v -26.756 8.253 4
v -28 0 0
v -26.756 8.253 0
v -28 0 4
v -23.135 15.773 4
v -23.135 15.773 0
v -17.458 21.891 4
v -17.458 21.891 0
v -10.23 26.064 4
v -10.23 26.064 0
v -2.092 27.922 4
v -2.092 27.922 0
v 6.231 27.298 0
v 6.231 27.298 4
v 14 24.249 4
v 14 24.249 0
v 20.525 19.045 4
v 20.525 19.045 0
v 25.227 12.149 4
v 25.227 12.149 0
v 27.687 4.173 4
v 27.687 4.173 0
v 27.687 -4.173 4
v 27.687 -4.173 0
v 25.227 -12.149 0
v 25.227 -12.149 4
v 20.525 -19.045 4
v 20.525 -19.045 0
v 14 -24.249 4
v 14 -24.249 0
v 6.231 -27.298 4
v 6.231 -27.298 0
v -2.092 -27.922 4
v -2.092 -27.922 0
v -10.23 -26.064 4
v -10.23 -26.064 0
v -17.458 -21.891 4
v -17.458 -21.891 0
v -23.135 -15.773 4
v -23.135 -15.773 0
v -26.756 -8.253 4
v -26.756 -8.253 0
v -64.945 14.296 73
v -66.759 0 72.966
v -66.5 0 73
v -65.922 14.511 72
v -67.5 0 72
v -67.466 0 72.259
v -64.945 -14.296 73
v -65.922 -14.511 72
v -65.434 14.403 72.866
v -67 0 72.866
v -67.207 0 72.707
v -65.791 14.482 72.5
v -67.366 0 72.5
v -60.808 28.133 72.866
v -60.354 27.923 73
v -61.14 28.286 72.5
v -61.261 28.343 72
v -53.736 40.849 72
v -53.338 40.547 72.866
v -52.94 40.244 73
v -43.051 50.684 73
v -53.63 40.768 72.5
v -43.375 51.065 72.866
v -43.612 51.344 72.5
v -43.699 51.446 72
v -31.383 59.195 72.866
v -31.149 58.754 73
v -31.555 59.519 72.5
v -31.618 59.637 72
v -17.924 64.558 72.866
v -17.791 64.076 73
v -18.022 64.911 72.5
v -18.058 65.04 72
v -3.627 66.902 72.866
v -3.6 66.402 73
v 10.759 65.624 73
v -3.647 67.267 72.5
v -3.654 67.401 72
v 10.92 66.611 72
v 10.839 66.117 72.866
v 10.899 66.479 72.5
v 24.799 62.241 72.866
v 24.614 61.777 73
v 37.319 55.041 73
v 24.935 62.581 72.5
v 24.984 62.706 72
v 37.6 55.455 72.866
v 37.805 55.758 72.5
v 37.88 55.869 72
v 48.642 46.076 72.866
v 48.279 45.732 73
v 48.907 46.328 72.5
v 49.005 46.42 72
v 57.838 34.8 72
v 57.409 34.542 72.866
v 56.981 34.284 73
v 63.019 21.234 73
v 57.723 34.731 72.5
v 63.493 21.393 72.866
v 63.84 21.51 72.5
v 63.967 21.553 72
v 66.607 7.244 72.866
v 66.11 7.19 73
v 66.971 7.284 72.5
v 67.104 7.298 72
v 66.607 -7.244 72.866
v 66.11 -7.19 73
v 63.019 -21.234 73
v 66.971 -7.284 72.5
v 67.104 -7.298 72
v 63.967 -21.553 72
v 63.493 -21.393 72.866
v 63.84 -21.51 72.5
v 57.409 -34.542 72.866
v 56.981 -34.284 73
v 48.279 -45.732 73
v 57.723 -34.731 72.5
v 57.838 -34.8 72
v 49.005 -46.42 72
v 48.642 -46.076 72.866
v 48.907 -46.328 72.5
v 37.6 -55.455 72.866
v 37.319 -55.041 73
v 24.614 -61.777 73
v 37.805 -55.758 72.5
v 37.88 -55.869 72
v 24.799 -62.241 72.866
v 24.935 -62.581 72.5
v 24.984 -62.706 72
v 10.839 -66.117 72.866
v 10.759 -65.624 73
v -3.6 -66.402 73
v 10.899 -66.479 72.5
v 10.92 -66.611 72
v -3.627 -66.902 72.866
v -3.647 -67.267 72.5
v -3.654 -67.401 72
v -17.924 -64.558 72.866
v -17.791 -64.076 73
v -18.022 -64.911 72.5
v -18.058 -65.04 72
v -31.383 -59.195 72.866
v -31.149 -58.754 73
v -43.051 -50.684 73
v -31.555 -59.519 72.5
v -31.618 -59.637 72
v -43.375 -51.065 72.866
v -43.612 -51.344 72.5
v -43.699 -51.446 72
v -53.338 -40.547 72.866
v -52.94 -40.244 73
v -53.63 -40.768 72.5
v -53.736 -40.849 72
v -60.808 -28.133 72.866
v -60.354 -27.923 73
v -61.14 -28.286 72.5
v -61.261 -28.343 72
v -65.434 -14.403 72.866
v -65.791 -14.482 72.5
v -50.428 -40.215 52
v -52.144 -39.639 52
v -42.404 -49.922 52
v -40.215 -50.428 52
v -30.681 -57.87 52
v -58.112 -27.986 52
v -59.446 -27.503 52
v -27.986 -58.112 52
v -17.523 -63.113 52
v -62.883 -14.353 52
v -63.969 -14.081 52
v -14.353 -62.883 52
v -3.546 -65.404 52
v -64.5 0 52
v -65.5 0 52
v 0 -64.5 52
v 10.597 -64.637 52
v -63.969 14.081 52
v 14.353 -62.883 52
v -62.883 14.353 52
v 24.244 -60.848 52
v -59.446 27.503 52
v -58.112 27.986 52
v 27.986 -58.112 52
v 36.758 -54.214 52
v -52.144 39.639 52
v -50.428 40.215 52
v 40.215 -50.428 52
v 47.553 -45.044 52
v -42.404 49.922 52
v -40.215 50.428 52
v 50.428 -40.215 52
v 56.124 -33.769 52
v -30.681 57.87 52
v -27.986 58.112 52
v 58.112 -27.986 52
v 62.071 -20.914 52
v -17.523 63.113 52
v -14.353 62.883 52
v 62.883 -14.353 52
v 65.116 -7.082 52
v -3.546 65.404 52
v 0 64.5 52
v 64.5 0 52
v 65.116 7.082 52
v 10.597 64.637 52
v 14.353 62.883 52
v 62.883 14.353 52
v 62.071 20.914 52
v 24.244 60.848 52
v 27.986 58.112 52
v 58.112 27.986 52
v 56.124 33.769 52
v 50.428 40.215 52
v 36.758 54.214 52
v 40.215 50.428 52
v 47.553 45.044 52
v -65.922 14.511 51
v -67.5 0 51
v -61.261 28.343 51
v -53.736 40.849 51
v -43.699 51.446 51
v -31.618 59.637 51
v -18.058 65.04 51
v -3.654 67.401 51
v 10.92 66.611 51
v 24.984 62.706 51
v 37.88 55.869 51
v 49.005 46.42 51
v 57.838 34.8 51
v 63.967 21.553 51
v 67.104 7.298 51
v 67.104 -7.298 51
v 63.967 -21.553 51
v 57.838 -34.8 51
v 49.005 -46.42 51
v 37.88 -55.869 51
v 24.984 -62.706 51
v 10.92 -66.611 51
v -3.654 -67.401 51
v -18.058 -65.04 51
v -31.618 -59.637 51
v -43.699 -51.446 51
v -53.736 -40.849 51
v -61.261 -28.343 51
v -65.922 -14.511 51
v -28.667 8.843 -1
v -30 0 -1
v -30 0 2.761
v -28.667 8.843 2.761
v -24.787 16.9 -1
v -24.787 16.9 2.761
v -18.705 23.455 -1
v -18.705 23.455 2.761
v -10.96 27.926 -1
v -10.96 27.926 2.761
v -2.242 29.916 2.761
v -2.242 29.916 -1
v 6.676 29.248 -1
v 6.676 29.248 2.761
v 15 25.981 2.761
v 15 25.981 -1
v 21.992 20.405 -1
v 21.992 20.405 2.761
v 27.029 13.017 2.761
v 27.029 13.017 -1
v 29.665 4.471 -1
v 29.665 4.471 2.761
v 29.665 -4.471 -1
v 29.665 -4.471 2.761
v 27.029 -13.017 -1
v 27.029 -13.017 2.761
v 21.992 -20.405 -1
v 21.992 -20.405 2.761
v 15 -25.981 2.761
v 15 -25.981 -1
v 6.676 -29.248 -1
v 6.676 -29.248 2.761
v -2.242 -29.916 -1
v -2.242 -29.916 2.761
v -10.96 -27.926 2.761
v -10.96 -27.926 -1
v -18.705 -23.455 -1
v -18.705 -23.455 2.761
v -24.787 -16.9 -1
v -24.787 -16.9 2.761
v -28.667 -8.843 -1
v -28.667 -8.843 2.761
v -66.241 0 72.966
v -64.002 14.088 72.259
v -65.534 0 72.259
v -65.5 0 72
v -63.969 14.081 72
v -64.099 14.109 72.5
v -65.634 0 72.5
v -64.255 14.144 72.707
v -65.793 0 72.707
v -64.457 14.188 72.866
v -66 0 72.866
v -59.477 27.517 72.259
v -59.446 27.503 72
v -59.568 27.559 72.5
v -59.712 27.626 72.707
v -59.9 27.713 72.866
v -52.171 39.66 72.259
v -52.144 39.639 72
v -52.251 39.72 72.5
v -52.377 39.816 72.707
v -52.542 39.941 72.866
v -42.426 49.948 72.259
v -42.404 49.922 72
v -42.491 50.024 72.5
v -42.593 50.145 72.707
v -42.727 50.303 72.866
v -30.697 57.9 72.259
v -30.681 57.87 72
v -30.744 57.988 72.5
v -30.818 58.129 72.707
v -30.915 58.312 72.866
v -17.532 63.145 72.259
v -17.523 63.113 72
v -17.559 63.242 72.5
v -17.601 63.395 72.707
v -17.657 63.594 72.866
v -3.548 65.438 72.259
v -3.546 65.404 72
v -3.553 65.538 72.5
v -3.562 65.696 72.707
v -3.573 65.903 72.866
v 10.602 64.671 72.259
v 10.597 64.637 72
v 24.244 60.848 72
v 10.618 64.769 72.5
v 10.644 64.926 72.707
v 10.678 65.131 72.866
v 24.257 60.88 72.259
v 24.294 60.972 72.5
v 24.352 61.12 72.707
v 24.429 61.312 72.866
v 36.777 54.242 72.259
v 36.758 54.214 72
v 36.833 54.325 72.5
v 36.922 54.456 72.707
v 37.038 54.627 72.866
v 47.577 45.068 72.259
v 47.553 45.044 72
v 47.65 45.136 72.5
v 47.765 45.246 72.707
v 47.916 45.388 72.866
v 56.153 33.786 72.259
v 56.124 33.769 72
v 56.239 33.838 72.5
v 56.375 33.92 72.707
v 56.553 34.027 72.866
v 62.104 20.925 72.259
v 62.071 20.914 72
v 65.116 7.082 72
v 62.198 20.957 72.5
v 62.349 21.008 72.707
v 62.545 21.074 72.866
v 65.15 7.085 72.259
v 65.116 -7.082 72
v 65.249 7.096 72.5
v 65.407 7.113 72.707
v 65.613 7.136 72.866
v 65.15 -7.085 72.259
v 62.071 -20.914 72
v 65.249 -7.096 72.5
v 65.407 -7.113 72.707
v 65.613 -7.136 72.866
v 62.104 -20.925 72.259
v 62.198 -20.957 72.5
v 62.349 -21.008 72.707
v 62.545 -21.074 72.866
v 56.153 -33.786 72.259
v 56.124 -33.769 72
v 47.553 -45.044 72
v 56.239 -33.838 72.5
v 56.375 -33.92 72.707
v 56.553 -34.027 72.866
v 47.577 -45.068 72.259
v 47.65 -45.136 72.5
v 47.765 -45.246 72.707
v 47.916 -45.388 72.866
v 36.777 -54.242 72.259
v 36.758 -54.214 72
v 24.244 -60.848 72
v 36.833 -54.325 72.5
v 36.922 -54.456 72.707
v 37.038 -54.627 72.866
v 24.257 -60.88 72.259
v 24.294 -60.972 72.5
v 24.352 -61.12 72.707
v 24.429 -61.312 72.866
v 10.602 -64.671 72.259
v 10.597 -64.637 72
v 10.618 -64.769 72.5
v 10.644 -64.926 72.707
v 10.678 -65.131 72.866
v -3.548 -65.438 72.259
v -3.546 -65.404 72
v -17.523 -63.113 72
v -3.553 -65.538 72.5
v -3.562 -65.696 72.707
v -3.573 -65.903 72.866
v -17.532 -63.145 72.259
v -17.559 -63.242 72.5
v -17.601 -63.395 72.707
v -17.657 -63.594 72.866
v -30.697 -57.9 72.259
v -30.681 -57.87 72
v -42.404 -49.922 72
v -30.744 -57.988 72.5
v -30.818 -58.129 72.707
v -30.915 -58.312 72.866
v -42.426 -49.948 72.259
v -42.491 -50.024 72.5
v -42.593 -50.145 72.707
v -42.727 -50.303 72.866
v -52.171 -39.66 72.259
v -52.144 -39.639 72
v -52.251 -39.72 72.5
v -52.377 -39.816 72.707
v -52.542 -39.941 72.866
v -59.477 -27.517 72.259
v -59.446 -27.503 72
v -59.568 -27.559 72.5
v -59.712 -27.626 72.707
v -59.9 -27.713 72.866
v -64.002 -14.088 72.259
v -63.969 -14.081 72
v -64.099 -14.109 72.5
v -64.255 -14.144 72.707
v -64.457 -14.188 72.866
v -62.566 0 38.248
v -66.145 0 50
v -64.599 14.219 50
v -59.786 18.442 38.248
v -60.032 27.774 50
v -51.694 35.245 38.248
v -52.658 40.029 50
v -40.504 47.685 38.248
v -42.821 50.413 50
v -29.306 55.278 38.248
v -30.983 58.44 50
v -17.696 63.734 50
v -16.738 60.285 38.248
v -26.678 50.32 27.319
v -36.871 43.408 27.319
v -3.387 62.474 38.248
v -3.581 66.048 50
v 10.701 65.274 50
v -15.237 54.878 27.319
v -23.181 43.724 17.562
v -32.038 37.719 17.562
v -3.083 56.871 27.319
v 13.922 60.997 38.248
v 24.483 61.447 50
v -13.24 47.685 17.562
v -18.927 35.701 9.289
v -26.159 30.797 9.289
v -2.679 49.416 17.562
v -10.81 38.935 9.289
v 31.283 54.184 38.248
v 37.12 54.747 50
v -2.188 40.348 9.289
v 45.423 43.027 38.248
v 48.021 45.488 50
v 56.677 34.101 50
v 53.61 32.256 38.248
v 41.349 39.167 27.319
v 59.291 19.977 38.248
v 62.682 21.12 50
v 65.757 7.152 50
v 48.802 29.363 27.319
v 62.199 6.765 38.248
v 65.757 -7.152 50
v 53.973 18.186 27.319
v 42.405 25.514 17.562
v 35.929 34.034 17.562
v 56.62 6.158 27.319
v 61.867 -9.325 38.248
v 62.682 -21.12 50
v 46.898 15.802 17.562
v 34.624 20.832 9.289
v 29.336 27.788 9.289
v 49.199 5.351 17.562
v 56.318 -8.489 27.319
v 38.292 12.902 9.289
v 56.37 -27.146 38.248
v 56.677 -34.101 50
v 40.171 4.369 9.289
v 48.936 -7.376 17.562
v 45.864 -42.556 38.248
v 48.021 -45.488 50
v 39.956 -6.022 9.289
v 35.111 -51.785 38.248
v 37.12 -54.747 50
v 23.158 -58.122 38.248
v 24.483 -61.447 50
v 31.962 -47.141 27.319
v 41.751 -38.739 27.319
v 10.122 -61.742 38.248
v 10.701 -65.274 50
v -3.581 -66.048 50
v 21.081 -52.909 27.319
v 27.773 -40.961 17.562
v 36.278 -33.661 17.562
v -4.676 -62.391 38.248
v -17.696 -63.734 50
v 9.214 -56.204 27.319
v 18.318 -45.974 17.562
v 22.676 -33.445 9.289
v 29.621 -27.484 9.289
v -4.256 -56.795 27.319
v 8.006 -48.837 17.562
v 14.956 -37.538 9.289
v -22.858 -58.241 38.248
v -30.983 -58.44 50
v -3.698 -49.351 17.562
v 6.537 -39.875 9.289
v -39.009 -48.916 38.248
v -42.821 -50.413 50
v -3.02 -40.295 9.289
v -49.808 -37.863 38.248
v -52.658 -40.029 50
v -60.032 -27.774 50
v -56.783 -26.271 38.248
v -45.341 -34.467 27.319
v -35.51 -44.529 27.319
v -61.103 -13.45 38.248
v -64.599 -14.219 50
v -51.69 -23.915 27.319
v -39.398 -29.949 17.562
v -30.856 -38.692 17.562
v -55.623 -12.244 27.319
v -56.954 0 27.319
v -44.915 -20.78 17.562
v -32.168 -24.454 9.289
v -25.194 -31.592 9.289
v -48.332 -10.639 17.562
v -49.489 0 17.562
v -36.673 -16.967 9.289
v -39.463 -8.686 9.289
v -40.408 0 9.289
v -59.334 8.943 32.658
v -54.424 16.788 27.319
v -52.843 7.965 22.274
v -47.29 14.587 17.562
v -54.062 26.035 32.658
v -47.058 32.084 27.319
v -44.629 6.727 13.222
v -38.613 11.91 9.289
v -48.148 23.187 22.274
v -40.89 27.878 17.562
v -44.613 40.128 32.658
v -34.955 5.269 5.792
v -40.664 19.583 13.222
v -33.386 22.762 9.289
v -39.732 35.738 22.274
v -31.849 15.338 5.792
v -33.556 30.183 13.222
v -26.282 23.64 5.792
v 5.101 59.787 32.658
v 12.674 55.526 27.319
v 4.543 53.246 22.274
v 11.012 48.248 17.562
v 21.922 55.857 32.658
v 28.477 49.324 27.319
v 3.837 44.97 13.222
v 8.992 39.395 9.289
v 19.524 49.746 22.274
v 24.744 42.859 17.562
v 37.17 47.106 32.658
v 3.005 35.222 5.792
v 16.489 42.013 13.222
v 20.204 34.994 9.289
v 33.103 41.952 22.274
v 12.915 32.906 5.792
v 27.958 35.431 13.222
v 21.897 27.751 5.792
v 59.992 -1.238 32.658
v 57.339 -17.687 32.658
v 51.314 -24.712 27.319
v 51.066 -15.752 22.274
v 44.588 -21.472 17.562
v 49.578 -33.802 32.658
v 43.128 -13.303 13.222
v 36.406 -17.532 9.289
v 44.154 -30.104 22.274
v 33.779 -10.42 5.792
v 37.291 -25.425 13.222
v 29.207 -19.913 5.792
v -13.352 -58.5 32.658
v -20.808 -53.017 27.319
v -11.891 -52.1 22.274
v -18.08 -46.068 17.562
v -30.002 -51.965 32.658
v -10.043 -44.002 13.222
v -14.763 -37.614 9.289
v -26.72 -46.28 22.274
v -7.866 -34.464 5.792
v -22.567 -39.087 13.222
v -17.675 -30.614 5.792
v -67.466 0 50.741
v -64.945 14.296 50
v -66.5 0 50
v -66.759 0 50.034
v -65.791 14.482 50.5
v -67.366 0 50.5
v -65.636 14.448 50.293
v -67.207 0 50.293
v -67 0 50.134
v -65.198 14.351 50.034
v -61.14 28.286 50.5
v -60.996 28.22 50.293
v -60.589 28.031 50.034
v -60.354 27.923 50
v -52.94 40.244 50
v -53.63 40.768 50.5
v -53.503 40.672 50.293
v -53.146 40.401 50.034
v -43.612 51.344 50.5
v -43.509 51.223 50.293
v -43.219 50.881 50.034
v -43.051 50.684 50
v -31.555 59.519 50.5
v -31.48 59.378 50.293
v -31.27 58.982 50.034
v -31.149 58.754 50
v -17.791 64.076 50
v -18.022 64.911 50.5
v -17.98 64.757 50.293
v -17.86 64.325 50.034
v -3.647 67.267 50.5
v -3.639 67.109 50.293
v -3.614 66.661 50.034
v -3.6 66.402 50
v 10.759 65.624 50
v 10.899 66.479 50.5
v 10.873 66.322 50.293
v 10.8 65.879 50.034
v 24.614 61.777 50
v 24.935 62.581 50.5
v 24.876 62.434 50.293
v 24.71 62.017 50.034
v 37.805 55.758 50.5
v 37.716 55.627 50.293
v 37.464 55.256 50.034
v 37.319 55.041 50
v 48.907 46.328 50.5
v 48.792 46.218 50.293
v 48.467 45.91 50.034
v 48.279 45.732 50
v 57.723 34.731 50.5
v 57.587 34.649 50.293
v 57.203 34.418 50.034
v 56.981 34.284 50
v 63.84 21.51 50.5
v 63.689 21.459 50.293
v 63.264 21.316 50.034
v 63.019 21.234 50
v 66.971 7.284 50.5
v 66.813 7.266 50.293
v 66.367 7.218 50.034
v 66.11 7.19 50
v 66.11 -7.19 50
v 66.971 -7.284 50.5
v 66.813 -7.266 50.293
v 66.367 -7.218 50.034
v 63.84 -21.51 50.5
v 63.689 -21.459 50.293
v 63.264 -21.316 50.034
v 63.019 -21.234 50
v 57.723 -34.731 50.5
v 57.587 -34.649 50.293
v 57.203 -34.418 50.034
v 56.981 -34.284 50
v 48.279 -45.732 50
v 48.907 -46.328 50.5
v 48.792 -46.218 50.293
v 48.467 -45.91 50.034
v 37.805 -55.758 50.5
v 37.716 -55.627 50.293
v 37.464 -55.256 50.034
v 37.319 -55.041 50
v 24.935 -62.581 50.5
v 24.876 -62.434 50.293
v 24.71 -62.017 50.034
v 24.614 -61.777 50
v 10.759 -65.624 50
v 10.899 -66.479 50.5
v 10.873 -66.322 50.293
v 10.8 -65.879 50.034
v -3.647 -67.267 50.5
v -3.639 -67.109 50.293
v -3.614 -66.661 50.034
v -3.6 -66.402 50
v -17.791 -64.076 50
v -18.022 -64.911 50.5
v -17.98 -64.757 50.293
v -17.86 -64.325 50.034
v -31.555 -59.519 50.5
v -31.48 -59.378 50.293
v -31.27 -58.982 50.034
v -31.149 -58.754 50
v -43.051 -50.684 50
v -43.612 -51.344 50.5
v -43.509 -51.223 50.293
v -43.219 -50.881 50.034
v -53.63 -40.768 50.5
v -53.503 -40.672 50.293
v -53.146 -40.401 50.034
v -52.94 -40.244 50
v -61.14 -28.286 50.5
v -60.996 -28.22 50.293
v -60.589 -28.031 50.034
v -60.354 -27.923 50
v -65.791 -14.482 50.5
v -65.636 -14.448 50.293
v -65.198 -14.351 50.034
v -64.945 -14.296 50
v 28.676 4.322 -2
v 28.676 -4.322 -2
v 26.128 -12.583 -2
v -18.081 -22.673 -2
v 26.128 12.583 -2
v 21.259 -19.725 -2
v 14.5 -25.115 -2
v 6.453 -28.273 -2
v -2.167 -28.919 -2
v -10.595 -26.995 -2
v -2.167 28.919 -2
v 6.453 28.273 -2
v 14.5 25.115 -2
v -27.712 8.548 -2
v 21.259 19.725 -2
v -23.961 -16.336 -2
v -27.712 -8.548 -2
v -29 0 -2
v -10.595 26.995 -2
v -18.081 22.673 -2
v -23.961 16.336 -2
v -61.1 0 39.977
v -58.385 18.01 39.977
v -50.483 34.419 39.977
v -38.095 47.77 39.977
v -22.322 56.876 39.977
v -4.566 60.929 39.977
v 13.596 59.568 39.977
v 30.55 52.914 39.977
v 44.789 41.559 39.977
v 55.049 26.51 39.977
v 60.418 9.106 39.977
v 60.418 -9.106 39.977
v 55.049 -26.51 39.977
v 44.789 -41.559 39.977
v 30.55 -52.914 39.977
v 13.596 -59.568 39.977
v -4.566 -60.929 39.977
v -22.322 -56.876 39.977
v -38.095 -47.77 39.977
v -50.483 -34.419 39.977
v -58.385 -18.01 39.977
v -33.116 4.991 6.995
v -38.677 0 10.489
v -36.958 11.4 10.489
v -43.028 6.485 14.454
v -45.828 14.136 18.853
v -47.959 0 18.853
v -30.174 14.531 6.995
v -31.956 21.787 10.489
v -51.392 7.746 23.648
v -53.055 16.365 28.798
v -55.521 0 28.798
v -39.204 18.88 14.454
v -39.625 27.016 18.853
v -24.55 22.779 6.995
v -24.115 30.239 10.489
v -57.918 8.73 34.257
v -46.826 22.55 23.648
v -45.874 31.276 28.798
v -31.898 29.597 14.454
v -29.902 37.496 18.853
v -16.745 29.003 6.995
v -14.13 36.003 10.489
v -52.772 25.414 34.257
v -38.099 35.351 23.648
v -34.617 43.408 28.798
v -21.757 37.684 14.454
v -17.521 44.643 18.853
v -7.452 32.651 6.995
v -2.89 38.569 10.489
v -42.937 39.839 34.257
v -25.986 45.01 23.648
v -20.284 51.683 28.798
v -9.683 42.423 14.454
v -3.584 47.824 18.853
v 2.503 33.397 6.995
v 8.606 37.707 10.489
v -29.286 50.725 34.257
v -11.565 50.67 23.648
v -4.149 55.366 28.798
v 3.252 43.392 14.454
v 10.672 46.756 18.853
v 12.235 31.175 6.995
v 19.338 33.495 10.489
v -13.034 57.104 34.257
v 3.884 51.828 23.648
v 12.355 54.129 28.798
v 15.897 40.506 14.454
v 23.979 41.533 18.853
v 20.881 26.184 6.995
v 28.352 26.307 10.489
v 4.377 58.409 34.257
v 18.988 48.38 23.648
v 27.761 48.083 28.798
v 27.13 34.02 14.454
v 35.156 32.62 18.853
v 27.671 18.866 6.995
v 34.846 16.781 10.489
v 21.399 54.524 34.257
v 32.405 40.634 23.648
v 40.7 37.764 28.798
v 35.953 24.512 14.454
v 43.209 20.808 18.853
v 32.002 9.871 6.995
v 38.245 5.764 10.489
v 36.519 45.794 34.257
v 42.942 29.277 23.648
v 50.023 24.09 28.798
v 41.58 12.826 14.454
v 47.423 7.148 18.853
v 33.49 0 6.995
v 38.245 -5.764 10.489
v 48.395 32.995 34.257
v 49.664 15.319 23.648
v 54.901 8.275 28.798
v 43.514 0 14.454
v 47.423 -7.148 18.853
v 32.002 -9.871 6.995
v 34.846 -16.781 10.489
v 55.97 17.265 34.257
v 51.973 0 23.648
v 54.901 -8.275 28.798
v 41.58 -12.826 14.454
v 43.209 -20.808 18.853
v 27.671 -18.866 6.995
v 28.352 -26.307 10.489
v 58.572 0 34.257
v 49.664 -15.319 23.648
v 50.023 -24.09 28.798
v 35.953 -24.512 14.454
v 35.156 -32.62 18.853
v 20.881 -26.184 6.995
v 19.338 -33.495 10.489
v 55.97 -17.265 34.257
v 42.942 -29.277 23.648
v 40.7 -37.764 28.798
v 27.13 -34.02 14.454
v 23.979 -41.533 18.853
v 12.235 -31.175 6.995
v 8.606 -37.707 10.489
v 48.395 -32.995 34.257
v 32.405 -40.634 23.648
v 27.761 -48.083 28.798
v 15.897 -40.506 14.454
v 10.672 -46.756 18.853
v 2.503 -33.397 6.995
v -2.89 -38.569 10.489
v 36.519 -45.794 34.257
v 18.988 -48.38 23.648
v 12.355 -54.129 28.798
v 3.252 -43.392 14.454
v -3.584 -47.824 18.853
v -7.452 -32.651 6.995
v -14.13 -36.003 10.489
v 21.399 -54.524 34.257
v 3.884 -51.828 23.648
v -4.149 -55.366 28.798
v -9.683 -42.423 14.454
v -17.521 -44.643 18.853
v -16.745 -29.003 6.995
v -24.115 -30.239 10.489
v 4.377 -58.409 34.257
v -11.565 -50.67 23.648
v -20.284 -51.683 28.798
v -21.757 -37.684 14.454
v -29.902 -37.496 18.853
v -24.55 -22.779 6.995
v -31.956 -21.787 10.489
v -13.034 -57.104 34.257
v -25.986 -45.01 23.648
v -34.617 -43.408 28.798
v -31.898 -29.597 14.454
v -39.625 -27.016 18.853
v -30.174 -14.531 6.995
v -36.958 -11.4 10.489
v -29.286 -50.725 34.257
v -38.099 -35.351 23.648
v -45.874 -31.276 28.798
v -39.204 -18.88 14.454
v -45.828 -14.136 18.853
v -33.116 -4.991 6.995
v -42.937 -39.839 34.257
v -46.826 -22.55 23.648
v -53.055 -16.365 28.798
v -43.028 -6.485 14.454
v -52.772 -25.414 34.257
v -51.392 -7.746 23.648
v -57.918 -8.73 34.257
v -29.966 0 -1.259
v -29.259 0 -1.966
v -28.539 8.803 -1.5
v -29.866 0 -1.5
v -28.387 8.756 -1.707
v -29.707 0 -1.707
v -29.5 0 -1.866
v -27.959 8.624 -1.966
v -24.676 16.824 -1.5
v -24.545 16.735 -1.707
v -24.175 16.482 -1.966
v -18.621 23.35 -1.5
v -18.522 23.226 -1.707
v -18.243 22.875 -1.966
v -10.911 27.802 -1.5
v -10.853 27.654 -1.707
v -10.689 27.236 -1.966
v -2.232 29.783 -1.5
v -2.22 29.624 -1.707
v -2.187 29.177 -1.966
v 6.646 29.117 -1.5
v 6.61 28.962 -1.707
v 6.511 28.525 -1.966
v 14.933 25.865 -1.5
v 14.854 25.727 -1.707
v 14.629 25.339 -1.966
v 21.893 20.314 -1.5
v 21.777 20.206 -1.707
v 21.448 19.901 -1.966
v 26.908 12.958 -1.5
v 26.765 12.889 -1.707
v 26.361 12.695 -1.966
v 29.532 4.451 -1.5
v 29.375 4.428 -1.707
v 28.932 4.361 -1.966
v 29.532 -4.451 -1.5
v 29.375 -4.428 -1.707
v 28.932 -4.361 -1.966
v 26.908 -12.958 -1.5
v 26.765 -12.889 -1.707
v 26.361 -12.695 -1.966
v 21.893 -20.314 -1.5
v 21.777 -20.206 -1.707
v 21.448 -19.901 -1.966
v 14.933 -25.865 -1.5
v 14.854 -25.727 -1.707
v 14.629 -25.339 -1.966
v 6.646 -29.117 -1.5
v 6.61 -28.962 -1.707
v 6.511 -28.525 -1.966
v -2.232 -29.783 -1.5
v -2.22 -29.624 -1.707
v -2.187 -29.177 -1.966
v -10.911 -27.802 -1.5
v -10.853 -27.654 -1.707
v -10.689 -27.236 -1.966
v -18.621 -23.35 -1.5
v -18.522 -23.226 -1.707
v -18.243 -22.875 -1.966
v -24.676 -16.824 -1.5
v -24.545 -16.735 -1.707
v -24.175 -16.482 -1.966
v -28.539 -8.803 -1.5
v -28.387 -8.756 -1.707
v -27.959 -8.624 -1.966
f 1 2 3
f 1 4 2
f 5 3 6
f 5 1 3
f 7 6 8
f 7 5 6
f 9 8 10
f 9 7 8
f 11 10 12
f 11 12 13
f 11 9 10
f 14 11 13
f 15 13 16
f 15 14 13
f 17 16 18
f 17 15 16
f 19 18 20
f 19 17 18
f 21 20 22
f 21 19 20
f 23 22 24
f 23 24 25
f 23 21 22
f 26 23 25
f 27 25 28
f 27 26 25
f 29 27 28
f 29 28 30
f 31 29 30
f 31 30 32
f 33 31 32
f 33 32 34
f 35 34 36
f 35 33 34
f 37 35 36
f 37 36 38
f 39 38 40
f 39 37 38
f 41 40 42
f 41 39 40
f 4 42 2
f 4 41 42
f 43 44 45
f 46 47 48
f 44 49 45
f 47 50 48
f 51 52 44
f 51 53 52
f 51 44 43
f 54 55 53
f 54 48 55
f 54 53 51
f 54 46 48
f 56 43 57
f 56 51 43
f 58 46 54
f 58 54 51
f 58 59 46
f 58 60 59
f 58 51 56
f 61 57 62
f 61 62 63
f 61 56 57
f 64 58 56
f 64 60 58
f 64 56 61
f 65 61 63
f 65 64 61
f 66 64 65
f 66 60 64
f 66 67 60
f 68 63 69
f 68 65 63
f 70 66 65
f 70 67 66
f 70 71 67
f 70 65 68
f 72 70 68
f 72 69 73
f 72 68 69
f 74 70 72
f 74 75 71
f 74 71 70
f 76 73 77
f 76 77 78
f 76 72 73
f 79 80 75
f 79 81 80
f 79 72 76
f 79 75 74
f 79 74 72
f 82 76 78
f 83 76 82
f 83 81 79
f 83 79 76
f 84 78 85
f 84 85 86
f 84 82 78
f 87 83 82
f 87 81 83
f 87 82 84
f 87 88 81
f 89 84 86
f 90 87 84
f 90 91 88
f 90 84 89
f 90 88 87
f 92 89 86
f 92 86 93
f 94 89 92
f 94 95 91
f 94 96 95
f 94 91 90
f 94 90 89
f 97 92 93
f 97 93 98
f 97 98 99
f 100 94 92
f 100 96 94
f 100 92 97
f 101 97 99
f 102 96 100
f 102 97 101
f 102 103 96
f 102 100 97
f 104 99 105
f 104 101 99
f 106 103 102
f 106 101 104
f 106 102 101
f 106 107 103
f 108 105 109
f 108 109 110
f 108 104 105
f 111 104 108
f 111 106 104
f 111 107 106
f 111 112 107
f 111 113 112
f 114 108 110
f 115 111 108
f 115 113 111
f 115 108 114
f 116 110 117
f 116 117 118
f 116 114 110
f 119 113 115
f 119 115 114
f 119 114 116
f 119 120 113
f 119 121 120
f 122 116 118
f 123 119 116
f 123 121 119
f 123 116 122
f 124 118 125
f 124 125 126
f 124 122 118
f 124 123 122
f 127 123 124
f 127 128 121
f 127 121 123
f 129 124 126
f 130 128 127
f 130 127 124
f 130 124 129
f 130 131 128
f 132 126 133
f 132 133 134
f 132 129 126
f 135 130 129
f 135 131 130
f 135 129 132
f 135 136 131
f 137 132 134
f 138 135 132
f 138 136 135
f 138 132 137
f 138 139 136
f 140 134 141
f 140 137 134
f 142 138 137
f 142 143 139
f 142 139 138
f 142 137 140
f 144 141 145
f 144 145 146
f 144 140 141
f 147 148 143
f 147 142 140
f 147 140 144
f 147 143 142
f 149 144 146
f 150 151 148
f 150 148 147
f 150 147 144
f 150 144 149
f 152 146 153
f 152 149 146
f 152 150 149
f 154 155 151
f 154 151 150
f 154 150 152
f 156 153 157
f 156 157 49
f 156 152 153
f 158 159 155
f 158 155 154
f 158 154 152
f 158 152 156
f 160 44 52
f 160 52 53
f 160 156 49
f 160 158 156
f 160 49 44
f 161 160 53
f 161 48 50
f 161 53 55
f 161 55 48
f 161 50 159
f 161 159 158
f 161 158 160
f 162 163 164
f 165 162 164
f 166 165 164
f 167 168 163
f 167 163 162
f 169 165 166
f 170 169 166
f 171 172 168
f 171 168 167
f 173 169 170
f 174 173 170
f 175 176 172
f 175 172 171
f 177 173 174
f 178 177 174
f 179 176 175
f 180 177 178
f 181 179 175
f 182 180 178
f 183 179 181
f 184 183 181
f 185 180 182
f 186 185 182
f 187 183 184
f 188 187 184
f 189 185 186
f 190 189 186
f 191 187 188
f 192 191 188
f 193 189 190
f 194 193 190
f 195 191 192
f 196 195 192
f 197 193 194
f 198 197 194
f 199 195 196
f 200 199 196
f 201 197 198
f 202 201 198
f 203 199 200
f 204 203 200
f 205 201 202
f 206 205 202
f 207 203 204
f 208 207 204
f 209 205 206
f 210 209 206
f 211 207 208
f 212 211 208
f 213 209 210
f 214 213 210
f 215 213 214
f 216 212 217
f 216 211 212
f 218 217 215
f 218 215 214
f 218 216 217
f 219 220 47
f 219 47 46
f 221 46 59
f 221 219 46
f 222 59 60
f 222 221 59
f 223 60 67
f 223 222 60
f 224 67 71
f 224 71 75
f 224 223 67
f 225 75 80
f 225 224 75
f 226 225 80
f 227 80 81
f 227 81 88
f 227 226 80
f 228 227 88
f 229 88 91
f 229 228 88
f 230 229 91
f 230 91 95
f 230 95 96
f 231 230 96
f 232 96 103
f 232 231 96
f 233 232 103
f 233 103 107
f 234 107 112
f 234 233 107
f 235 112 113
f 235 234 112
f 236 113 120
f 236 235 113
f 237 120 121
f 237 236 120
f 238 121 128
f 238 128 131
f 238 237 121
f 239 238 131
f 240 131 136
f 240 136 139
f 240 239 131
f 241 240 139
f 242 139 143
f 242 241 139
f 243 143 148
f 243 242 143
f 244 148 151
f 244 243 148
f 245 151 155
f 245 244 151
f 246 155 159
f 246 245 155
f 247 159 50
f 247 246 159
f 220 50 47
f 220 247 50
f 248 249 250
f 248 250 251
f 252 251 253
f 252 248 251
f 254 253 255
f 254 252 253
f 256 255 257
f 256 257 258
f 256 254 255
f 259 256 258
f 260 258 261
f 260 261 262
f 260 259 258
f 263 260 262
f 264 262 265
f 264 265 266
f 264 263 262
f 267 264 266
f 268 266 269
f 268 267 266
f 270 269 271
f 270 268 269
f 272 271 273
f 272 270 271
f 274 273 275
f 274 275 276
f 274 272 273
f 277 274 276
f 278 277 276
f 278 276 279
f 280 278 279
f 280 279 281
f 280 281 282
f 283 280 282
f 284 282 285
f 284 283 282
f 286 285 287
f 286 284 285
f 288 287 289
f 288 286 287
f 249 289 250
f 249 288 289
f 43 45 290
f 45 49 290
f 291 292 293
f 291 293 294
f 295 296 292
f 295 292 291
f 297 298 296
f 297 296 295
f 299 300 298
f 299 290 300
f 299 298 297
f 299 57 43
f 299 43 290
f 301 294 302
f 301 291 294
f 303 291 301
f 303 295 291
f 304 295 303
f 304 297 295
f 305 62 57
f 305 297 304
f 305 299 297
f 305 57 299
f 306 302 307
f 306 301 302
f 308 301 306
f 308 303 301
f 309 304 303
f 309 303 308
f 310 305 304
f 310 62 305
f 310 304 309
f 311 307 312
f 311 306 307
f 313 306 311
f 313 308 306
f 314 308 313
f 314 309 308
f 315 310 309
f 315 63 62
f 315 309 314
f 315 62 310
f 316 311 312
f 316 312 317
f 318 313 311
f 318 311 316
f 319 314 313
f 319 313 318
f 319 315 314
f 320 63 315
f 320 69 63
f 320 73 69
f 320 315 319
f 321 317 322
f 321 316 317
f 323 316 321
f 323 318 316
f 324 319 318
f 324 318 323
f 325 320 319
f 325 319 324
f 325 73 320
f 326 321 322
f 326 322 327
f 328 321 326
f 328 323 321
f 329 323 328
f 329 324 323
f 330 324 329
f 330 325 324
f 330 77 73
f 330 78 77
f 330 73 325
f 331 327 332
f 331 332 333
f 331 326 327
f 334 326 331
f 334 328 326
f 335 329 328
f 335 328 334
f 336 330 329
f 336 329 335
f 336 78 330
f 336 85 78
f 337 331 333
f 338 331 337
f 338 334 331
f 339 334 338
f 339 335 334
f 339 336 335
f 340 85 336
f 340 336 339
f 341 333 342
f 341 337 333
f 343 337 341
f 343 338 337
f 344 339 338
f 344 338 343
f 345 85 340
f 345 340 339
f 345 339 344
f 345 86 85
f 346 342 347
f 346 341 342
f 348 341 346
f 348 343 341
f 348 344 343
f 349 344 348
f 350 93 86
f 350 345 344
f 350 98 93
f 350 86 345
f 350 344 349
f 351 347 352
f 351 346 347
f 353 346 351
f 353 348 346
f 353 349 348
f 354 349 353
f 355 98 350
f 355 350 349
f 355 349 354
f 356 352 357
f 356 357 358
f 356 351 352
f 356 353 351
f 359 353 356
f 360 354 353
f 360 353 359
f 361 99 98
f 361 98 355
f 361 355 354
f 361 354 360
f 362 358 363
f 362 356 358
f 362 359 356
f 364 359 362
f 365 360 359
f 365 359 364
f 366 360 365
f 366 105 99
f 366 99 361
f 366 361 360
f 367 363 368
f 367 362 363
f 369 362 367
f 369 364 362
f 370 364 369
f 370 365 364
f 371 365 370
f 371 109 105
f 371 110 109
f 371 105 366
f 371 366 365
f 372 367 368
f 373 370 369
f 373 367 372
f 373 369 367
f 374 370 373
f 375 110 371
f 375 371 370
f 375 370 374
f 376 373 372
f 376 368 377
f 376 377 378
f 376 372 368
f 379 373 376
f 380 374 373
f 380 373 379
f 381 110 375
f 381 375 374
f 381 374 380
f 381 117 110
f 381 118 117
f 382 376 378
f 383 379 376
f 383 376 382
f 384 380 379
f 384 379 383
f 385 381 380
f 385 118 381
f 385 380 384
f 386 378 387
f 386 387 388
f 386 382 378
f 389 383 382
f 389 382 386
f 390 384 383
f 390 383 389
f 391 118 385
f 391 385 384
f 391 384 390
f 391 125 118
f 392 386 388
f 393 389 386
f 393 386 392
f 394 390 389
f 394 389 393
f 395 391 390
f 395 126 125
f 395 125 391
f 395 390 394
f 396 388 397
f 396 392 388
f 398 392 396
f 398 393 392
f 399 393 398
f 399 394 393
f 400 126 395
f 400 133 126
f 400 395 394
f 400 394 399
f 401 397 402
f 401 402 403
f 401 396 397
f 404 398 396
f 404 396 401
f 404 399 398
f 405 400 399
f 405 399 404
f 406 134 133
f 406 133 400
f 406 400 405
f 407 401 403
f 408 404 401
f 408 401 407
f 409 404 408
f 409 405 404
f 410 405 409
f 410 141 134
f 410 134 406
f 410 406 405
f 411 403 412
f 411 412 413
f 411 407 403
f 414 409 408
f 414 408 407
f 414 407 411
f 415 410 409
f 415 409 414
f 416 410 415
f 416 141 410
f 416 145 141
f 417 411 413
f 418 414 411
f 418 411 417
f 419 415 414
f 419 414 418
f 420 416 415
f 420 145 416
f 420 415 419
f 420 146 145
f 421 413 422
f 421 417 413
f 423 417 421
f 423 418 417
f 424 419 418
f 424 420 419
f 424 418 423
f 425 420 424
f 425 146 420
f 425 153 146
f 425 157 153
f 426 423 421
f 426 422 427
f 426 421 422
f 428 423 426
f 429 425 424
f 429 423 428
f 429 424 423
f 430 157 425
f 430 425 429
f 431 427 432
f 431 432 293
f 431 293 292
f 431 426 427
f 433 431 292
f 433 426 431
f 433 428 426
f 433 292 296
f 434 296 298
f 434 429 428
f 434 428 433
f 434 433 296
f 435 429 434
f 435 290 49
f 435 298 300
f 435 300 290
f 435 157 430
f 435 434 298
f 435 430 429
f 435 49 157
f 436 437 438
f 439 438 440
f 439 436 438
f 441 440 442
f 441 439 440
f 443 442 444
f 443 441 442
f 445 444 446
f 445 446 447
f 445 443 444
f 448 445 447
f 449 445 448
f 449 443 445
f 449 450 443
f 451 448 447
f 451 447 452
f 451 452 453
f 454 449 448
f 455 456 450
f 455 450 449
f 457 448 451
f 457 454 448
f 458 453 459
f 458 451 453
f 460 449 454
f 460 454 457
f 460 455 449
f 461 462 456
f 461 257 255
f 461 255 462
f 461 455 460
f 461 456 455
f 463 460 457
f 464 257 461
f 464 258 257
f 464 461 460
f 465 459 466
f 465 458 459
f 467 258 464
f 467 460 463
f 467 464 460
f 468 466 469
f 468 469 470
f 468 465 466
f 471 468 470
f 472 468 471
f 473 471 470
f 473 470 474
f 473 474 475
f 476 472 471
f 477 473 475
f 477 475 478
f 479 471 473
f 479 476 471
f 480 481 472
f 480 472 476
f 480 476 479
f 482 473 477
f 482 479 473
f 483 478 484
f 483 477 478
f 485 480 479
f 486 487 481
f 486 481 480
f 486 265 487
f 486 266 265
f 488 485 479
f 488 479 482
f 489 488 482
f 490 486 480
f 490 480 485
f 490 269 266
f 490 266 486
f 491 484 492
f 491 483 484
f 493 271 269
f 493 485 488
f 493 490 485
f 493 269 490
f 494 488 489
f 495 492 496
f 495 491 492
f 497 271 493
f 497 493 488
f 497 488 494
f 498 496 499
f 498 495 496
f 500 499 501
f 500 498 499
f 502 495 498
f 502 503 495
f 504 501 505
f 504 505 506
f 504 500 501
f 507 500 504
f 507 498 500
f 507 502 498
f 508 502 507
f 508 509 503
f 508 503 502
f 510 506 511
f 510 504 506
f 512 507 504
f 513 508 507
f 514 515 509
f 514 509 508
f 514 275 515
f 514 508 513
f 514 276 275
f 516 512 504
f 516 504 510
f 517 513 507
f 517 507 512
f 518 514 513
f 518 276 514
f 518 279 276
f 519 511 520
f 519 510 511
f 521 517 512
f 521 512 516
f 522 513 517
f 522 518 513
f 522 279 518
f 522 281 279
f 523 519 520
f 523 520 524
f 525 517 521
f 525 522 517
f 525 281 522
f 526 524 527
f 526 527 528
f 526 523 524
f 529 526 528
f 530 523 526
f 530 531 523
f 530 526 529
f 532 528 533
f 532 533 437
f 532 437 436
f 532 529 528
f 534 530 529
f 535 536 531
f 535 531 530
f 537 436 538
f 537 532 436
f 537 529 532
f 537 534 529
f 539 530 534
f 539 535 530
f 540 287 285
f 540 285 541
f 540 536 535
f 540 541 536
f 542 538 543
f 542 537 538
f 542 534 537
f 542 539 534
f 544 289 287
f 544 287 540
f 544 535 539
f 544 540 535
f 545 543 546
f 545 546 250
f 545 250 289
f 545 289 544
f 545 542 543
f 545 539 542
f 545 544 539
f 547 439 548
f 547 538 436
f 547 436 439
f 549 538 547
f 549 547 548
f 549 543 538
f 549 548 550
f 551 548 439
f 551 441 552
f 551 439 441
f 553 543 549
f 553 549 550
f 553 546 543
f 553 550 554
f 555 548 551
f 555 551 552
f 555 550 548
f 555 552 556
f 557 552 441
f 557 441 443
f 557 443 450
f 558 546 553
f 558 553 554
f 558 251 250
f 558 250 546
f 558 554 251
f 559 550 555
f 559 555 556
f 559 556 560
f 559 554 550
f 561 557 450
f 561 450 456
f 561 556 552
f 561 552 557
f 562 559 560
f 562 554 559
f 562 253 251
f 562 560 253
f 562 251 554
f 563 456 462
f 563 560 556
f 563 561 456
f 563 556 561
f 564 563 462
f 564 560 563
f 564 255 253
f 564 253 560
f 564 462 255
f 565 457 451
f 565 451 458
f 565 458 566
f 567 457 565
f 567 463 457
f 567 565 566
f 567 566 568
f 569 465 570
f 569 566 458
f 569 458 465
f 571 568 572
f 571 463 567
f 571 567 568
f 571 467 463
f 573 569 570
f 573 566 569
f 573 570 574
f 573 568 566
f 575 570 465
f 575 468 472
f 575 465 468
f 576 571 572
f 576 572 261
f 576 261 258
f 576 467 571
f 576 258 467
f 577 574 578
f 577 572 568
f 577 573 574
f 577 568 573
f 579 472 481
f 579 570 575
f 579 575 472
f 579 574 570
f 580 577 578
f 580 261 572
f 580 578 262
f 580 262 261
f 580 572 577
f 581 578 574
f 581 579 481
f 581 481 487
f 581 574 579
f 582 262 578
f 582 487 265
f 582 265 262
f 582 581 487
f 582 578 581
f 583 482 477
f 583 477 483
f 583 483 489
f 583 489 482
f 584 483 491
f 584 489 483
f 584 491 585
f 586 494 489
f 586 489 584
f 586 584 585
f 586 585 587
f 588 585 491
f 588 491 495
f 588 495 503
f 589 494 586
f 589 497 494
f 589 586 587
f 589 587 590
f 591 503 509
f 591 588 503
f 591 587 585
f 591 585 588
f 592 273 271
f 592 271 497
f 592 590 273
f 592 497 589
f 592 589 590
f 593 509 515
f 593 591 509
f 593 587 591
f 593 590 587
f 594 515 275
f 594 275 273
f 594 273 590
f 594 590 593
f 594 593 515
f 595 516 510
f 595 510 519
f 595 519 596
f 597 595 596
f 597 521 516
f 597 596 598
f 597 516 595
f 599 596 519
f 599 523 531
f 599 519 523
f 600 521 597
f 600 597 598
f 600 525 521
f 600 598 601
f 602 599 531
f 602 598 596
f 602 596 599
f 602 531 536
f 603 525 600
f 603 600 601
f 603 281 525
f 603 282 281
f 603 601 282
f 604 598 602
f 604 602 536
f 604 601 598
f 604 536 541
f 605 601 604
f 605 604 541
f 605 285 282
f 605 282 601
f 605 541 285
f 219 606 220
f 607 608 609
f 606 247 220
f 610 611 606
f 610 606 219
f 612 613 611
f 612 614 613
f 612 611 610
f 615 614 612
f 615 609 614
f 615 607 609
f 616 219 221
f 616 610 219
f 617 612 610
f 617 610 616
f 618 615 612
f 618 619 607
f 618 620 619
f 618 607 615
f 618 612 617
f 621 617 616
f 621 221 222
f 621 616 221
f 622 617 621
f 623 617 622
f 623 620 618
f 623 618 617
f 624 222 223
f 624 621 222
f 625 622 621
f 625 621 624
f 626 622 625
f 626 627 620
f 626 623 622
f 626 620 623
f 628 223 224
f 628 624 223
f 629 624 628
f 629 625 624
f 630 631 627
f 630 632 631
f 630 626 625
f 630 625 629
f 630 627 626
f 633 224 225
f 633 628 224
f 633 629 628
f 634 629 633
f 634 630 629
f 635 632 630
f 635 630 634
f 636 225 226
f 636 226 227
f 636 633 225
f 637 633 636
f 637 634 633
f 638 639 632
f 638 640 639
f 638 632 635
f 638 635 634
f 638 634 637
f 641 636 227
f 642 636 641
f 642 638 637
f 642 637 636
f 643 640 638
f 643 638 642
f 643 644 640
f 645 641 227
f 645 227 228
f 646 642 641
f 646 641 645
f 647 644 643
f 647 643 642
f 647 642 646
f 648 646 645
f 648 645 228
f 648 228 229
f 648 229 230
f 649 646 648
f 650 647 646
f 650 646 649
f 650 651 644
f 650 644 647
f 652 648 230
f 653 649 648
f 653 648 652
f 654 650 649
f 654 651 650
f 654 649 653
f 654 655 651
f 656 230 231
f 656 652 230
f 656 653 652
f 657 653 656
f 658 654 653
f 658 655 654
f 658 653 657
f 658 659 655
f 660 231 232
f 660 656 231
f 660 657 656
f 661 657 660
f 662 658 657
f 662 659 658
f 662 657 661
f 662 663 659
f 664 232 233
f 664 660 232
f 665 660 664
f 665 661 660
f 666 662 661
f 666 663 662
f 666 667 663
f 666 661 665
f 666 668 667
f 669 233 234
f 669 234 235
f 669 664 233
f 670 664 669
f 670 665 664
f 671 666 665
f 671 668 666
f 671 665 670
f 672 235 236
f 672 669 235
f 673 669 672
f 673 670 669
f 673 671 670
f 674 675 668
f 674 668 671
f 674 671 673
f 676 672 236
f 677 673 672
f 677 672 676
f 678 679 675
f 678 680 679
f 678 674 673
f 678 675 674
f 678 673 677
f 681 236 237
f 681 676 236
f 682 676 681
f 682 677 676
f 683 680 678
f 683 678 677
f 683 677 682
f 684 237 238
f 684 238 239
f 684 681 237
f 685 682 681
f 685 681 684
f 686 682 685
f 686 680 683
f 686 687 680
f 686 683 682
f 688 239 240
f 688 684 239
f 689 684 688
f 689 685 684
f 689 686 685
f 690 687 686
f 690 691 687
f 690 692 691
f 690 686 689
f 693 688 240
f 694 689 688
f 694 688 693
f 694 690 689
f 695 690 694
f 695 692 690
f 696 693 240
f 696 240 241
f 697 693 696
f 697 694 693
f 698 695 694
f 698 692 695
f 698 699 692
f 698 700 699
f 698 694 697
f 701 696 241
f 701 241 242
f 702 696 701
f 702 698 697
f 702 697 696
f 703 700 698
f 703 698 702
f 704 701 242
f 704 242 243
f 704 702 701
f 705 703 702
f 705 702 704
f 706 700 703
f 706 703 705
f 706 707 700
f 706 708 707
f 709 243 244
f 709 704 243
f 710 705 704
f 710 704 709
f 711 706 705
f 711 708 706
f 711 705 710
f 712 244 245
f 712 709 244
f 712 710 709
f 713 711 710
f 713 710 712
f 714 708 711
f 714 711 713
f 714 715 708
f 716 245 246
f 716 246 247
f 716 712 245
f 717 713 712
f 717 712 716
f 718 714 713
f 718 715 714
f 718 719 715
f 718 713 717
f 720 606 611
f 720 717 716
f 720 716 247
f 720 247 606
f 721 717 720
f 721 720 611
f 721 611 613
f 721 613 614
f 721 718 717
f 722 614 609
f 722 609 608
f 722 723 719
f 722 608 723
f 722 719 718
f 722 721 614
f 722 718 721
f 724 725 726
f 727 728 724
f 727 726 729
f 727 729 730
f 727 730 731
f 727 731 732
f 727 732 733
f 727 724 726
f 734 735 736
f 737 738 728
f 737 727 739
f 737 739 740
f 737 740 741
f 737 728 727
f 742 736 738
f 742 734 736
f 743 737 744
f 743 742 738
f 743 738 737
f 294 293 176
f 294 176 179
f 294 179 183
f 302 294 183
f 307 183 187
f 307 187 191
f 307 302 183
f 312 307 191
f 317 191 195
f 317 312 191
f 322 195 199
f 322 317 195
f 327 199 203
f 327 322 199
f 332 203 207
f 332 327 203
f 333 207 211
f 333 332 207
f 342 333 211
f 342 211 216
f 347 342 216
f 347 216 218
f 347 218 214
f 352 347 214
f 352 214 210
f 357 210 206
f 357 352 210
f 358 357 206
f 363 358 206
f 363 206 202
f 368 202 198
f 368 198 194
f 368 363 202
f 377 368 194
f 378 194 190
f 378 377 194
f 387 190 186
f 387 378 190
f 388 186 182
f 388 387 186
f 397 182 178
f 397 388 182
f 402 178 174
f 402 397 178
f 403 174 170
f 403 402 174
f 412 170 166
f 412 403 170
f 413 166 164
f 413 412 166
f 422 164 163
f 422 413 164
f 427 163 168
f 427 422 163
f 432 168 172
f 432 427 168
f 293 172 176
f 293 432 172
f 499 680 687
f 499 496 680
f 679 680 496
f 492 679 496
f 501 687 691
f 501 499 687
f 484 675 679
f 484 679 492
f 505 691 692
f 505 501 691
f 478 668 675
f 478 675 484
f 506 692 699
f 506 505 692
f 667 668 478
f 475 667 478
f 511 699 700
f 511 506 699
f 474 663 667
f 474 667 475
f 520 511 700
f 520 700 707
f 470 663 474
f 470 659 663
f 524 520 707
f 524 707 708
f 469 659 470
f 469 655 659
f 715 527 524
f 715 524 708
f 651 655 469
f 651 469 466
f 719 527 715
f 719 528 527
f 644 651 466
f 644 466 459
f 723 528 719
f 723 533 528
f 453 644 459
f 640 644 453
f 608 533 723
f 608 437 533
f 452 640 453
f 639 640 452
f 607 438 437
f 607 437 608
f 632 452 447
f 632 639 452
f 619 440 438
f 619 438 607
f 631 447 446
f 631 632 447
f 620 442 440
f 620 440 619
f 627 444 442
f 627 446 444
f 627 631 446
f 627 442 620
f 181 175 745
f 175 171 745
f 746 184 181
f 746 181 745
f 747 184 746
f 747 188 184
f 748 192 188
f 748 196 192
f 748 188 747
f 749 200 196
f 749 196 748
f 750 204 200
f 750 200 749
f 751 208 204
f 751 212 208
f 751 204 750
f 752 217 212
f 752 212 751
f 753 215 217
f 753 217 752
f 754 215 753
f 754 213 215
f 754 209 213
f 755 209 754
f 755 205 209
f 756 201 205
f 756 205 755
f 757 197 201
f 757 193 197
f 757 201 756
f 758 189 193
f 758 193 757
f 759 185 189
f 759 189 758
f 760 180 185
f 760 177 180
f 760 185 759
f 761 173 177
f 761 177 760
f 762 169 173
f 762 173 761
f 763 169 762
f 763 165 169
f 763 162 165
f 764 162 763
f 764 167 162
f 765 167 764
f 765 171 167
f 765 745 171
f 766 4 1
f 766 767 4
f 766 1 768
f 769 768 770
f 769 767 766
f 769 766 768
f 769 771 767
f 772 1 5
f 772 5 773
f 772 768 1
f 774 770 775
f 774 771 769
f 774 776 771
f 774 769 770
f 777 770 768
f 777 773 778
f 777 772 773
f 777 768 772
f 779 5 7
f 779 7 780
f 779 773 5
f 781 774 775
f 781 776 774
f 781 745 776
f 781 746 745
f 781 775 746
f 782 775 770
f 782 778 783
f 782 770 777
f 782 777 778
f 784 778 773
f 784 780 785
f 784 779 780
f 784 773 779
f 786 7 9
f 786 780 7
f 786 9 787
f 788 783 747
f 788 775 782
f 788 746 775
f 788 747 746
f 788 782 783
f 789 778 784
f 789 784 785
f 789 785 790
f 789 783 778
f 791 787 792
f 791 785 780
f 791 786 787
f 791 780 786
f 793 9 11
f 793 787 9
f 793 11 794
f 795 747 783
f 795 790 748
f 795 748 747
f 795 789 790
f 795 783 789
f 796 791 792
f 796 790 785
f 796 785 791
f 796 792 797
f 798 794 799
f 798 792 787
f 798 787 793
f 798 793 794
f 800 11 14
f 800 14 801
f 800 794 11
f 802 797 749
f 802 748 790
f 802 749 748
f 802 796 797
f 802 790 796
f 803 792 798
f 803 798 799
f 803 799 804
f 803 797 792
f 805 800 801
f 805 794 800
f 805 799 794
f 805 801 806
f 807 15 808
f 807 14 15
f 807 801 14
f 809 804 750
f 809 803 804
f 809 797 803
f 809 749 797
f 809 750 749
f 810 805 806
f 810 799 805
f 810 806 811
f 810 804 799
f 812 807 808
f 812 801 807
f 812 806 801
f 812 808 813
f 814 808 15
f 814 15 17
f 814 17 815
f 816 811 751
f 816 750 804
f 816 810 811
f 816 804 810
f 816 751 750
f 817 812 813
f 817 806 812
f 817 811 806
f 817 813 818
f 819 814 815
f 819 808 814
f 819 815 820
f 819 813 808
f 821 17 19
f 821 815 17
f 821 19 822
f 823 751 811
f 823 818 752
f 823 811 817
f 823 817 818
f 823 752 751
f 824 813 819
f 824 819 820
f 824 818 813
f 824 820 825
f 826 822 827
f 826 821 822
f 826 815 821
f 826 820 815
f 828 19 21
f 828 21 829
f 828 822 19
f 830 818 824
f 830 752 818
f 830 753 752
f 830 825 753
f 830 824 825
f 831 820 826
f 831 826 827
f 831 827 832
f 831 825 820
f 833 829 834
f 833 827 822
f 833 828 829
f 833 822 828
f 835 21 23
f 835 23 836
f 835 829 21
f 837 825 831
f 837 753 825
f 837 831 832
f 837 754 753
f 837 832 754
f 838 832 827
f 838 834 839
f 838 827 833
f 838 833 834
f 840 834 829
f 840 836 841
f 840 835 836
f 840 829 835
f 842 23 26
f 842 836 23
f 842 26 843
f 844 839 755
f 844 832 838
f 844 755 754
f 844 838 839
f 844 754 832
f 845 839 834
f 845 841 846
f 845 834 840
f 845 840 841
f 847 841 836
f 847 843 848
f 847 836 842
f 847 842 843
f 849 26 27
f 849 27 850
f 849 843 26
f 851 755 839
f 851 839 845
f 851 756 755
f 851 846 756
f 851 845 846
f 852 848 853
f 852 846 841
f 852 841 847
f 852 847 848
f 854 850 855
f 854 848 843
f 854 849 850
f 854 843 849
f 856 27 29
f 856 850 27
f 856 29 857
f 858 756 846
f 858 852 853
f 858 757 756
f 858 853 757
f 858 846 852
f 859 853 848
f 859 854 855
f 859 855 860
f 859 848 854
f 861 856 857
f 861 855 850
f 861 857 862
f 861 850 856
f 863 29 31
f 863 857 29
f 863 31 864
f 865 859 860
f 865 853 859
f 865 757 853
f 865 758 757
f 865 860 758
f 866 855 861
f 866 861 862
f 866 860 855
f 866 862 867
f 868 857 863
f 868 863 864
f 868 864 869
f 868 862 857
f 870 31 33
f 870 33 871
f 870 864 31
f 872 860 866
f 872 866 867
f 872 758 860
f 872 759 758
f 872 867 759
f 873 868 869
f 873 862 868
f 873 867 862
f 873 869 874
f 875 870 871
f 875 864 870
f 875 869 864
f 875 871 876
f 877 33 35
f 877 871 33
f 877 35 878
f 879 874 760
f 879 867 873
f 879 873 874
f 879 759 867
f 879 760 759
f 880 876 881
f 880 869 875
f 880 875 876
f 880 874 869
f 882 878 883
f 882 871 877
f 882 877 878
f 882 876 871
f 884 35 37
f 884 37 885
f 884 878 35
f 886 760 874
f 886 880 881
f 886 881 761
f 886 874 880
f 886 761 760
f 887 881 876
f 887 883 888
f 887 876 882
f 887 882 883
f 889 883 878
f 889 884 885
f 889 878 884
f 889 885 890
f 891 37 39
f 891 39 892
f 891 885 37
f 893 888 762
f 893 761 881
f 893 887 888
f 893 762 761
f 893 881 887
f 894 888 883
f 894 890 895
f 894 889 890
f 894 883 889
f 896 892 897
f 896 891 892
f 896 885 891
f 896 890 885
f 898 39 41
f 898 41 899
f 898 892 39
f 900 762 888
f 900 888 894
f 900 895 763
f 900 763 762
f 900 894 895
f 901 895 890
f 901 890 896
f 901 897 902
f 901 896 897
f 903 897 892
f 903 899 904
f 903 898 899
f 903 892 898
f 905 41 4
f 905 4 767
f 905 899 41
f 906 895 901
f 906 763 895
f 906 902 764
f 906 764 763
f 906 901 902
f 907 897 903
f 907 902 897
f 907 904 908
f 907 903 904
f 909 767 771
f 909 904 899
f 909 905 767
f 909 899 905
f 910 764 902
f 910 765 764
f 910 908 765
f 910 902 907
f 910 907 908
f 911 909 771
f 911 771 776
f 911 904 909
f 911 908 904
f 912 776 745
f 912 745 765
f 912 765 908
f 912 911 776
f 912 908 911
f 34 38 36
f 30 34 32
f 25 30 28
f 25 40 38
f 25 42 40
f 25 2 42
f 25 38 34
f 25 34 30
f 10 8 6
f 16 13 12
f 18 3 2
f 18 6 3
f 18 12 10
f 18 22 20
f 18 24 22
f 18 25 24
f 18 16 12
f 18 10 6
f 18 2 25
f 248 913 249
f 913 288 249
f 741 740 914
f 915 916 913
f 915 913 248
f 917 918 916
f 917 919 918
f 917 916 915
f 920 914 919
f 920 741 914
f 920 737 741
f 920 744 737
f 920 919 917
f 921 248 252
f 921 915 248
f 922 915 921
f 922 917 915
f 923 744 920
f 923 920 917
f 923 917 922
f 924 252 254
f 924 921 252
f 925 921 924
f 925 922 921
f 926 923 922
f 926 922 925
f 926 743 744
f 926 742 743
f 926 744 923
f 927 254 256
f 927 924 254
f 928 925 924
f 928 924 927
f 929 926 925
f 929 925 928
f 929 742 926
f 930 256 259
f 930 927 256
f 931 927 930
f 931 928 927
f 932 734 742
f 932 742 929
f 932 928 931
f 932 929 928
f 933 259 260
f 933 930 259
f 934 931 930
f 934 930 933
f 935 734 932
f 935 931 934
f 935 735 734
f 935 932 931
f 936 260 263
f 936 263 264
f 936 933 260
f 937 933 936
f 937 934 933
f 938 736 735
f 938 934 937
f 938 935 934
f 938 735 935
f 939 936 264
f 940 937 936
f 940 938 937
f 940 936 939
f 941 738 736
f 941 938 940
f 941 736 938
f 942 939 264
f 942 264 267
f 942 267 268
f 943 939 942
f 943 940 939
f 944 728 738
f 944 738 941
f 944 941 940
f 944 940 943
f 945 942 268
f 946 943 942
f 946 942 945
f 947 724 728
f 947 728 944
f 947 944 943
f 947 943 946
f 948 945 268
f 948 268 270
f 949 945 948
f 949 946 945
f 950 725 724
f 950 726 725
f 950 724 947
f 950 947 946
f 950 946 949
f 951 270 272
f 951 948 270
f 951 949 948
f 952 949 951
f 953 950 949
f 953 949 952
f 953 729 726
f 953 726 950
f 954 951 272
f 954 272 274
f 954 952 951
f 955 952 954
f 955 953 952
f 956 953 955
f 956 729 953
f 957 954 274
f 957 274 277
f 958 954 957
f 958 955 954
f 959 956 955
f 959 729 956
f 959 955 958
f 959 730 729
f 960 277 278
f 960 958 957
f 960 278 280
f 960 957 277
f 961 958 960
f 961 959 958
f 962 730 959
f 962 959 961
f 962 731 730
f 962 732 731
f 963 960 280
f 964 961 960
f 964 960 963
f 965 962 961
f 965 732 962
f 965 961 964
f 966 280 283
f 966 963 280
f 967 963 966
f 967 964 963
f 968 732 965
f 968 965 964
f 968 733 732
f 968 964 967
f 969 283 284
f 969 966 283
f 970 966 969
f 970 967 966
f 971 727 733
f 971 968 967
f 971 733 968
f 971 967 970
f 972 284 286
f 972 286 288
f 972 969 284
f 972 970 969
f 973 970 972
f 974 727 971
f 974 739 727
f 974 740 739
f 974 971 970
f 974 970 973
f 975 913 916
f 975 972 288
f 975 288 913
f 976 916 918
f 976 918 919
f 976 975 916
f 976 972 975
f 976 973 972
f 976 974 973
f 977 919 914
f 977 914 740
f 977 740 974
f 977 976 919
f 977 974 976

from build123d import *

# Parameters (mm, degrees)
F2_R = 0.99999


# Not quite as in the source:
# - a fillet or chamfer is up to 0.001 mm smaller than in the source, because OpenCascade refuses the exact size


with BuildPart() as f1:
    # F0 (on Front) → F1 (revolve)
    with BuildSketch(Plane.XZ):
        with BuildLine():
            Line((-64.5, 52), (-65.5, 52))
            Line((-65.5, 52), (-65.5, 73))
            Line((-65.5, 73), (-67.5, 73))
            Line((-67.5, 73), (-67.5, 50))
            Line((-67.5, 50), (-66.1449700482, 50))
            ThreePointArc((-66.1449700482, 50), (-53.4398255255, 22.2737739938), (-30, 2.761242502))
            Line((-30, 2.761242502), (-30, -2))
            Line((-30, -2), (0, -2))
            Line((0, -2), (0, 0))
            Line((0, 0), (-28, 0))
            Line((-28, 0), (-28, 4))
            ThreePointArc((-28, 4), (-51.9728387009, 23.6482580712), (-64.5, 52))
        make_face()
    revolve(axis=Axis((0, 0, -1), (0, 0, -1)))

    # F2 (radius 1 in the source; OpenCascade refuses exactly that, so slightly less here)
    f2_edges = [f1.edges().sort_by_distance(p)[0] for p in [
        (67.5, 0, 73),
        (65.5, 0, 73),
        (67.5, 0, 50),
        (30, 0, -2),
    ]]
    fillet(f2_edges, radius=F2_R)


solid = f1.part
